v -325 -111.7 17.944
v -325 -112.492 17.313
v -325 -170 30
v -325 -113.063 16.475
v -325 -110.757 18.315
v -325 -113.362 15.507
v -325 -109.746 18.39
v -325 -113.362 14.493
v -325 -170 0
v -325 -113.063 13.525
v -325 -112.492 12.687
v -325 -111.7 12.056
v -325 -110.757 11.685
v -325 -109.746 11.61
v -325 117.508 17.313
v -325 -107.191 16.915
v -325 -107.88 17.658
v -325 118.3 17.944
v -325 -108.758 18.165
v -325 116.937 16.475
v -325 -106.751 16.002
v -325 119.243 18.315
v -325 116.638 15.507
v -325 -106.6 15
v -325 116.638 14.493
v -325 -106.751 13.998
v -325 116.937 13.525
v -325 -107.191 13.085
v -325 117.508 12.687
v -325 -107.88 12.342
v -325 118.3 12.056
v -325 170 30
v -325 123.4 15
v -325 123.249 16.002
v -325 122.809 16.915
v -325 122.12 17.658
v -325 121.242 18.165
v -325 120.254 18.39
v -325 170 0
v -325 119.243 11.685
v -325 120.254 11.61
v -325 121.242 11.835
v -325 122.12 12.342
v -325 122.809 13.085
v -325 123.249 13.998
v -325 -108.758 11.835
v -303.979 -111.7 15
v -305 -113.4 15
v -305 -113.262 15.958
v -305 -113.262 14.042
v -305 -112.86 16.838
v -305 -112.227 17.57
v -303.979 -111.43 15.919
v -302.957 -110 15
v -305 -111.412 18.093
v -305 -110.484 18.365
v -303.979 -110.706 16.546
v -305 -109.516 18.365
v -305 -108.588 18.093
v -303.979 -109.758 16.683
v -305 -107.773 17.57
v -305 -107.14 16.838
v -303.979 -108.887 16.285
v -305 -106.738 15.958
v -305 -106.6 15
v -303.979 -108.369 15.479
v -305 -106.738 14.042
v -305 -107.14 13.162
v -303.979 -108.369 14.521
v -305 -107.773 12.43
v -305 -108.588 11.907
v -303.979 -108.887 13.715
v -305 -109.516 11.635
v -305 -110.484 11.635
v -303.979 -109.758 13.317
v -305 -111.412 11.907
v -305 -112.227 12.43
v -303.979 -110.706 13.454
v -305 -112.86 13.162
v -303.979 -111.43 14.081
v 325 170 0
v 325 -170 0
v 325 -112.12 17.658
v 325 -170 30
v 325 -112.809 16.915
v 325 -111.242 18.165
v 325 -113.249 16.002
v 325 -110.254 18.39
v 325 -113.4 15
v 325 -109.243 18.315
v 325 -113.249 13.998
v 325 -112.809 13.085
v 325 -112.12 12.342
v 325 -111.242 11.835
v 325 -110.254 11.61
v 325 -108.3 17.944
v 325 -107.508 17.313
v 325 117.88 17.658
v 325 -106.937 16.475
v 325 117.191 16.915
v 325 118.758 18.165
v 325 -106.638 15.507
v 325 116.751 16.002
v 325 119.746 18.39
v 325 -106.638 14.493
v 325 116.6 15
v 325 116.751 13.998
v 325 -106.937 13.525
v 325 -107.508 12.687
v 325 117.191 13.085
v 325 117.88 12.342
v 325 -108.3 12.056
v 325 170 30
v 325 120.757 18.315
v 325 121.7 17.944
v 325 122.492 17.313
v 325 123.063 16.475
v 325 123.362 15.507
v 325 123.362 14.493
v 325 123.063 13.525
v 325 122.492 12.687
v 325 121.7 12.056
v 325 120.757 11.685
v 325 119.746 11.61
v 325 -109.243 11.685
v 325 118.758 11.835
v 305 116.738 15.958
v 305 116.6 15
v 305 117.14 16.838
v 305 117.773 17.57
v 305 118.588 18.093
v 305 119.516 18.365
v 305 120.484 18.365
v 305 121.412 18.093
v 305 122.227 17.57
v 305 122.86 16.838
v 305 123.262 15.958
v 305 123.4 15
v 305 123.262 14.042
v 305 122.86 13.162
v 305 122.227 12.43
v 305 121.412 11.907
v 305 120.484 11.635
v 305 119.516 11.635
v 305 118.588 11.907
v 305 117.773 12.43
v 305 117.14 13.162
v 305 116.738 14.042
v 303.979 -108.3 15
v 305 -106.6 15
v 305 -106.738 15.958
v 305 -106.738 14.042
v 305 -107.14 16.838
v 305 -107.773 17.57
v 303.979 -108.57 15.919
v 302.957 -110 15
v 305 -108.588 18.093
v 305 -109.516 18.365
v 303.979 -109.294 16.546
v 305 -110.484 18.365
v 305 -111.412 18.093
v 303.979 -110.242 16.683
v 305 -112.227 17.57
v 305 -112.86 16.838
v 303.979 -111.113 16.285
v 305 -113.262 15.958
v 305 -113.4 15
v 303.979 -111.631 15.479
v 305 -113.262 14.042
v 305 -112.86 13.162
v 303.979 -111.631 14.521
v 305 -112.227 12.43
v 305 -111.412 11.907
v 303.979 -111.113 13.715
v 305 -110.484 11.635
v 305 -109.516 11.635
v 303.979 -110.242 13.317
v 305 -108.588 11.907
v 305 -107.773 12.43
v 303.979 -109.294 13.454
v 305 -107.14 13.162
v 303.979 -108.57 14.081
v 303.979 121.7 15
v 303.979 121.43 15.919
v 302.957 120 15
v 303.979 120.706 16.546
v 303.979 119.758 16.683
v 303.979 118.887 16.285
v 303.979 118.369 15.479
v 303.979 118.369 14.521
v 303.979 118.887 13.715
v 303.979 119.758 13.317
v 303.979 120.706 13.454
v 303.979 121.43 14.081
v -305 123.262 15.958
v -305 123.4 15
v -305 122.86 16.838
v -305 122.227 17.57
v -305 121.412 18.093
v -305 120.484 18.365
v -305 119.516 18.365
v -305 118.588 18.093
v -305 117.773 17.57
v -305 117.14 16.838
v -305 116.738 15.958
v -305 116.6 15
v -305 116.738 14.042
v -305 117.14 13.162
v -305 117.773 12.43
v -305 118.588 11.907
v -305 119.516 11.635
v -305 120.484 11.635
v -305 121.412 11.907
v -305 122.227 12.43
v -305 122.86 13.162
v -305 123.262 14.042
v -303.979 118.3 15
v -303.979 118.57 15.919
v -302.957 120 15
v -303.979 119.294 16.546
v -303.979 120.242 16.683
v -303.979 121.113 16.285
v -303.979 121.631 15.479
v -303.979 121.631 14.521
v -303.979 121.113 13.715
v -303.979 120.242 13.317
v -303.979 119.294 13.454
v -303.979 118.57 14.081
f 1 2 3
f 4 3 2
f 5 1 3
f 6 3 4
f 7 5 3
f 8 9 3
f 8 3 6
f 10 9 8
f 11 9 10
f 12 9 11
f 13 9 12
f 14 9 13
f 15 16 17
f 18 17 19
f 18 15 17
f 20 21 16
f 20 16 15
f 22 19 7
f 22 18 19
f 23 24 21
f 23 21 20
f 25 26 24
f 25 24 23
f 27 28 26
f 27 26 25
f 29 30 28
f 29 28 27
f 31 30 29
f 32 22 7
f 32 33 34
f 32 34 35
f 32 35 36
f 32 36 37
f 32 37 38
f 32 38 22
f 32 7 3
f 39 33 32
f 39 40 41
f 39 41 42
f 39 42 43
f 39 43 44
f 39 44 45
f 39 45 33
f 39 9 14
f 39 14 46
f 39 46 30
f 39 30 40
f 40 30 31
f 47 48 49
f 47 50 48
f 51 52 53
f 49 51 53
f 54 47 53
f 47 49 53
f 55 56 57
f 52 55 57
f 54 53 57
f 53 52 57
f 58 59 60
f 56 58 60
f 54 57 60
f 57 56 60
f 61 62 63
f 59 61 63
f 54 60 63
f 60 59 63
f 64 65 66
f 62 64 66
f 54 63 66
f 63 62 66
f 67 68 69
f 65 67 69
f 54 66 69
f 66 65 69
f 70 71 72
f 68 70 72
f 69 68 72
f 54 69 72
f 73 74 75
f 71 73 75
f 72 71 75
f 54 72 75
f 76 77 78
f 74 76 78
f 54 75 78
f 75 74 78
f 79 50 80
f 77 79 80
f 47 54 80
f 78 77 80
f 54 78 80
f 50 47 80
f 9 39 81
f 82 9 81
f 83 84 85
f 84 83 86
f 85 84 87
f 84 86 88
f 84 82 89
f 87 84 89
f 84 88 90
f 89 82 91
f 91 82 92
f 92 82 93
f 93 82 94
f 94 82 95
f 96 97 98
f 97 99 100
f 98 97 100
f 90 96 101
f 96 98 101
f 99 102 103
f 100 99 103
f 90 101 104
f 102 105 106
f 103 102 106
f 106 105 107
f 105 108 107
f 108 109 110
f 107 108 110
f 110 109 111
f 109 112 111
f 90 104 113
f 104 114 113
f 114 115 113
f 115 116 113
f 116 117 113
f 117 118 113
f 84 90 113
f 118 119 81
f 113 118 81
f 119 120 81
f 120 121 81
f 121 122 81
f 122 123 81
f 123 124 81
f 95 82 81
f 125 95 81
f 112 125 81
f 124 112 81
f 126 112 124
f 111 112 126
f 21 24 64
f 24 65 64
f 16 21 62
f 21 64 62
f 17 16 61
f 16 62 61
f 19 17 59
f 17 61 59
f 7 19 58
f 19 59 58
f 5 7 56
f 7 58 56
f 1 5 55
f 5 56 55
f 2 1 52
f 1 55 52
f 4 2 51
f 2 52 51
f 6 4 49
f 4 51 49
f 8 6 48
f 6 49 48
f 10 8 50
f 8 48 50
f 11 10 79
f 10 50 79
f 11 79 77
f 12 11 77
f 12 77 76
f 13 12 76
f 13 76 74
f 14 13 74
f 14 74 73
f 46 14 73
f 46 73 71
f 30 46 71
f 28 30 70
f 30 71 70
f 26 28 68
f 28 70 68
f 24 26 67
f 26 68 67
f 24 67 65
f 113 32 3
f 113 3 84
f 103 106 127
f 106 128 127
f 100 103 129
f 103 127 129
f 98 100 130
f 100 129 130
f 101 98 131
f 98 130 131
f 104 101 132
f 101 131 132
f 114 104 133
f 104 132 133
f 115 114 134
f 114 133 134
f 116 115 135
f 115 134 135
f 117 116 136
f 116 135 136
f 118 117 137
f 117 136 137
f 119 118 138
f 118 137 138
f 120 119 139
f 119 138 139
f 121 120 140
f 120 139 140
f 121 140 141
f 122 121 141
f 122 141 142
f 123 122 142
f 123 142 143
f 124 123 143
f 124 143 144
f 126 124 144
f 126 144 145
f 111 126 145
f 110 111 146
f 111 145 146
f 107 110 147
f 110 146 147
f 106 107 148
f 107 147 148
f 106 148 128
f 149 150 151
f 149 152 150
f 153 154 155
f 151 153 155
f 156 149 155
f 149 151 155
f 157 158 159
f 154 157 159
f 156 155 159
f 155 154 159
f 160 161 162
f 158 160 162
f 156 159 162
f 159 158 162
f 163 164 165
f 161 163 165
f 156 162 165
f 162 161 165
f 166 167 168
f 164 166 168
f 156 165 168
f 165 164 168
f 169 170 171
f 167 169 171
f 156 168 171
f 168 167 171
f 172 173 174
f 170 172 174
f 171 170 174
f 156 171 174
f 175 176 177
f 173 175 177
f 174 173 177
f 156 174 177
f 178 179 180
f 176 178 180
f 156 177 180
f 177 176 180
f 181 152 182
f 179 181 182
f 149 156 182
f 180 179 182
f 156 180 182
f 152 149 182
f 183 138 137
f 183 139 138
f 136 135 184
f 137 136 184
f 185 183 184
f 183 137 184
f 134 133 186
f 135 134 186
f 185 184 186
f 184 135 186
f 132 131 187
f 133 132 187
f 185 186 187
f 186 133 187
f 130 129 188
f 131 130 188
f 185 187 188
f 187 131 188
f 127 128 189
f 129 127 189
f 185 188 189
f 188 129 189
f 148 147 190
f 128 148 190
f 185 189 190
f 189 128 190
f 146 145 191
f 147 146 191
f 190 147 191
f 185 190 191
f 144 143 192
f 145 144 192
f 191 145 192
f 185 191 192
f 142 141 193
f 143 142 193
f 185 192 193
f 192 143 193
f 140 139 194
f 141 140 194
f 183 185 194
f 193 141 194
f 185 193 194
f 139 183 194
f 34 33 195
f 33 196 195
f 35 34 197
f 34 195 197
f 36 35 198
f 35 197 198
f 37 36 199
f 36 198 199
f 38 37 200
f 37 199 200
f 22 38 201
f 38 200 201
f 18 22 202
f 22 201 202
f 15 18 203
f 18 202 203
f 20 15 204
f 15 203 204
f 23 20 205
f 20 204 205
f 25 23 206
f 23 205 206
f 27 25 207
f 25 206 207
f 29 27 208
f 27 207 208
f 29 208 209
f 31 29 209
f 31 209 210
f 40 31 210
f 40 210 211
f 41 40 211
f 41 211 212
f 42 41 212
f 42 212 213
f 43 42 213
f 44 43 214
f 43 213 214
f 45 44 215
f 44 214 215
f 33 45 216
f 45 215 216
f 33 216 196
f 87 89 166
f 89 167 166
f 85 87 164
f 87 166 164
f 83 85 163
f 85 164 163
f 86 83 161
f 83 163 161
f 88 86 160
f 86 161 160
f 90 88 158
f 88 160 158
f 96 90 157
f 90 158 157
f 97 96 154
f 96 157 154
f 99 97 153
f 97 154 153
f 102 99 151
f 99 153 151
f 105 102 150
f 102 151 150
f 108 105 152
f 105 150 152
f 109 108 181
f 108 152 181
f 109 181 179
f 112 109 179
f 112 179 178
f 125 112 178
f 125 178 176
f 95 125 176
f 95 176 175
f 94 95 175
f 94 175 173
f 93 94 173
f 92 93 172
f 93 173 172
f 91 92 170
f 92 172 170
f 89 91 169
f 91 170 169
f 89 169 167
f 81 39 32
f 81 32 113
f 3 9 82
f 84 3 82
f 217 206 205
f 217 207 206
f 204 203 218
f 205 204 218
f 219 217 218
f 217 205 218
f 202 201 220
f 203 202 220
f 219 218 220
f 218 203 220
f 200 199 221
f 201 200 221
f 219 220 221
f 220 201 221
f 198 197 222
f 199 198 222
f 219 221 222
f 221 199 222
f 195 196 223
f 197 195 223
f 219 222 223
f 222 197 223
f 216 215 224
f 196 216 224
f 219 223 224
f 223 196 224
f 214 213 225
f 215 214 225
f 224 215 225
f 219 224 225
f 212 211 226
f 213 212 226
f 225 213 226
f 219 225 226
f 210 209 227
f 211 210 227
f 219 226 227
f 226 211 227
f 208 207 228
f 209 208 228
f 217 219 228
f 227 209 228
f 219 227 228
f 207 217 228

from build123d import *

# Parameters (mm, degrees)
F0_W           = 650
F0_H           = 340
F1_DEPTH       = 30
F4_D           = 6.8
F4_DEPTH       = 20
F4_TIP         = 2.0429261047
F4_ON_F3_D     = 6.8
F4_ON_F3_DEPTH = 20
F4_ON_F3_TIP   = 2.0429261047


with BuildPart() as f1:
    # F0 (on Top) → F1 (new body)
    with BuildSketch(Plane.XY):
        Rectangle(F0_W, F0_H)
    extrude(amount=F1_DEPTH)

    # F4
    with Locations(Plane.YZ.offset(325)):
        with Locations((-110, 15), (120, 15)):
            Hole(F4_D / 2, depth=F4_DEPTH)
            with Locations((0, 0, -(F4_DEPTH + F4_TIP / 2))):  # 118° drill point
                Cone(0, F4_D / 2, F4_TIP, mode=Mode.SUBTRACT)

    # F4 on F3
    with Locations(Plane(origin=(-325, 0, 0), x_dir=(0, -1, 0), z_dir=(-1, 0, 0))):
        with Locations((-120, 15), (110, 15)):
            Hole(F4_ON_F3_D / 2, depth=F4_ON_F3_DEPTH)
            with Locations((0, 0, -(F4_ON_F3_DEPTH + F4_ON_F3_TIP / 2))):  # 118° drill point
                Cone(0, F4_ON_F3_D / 2, F4_ON_F3_TIP, mode=Mode.SUBTRACT)


solid = f1.part
